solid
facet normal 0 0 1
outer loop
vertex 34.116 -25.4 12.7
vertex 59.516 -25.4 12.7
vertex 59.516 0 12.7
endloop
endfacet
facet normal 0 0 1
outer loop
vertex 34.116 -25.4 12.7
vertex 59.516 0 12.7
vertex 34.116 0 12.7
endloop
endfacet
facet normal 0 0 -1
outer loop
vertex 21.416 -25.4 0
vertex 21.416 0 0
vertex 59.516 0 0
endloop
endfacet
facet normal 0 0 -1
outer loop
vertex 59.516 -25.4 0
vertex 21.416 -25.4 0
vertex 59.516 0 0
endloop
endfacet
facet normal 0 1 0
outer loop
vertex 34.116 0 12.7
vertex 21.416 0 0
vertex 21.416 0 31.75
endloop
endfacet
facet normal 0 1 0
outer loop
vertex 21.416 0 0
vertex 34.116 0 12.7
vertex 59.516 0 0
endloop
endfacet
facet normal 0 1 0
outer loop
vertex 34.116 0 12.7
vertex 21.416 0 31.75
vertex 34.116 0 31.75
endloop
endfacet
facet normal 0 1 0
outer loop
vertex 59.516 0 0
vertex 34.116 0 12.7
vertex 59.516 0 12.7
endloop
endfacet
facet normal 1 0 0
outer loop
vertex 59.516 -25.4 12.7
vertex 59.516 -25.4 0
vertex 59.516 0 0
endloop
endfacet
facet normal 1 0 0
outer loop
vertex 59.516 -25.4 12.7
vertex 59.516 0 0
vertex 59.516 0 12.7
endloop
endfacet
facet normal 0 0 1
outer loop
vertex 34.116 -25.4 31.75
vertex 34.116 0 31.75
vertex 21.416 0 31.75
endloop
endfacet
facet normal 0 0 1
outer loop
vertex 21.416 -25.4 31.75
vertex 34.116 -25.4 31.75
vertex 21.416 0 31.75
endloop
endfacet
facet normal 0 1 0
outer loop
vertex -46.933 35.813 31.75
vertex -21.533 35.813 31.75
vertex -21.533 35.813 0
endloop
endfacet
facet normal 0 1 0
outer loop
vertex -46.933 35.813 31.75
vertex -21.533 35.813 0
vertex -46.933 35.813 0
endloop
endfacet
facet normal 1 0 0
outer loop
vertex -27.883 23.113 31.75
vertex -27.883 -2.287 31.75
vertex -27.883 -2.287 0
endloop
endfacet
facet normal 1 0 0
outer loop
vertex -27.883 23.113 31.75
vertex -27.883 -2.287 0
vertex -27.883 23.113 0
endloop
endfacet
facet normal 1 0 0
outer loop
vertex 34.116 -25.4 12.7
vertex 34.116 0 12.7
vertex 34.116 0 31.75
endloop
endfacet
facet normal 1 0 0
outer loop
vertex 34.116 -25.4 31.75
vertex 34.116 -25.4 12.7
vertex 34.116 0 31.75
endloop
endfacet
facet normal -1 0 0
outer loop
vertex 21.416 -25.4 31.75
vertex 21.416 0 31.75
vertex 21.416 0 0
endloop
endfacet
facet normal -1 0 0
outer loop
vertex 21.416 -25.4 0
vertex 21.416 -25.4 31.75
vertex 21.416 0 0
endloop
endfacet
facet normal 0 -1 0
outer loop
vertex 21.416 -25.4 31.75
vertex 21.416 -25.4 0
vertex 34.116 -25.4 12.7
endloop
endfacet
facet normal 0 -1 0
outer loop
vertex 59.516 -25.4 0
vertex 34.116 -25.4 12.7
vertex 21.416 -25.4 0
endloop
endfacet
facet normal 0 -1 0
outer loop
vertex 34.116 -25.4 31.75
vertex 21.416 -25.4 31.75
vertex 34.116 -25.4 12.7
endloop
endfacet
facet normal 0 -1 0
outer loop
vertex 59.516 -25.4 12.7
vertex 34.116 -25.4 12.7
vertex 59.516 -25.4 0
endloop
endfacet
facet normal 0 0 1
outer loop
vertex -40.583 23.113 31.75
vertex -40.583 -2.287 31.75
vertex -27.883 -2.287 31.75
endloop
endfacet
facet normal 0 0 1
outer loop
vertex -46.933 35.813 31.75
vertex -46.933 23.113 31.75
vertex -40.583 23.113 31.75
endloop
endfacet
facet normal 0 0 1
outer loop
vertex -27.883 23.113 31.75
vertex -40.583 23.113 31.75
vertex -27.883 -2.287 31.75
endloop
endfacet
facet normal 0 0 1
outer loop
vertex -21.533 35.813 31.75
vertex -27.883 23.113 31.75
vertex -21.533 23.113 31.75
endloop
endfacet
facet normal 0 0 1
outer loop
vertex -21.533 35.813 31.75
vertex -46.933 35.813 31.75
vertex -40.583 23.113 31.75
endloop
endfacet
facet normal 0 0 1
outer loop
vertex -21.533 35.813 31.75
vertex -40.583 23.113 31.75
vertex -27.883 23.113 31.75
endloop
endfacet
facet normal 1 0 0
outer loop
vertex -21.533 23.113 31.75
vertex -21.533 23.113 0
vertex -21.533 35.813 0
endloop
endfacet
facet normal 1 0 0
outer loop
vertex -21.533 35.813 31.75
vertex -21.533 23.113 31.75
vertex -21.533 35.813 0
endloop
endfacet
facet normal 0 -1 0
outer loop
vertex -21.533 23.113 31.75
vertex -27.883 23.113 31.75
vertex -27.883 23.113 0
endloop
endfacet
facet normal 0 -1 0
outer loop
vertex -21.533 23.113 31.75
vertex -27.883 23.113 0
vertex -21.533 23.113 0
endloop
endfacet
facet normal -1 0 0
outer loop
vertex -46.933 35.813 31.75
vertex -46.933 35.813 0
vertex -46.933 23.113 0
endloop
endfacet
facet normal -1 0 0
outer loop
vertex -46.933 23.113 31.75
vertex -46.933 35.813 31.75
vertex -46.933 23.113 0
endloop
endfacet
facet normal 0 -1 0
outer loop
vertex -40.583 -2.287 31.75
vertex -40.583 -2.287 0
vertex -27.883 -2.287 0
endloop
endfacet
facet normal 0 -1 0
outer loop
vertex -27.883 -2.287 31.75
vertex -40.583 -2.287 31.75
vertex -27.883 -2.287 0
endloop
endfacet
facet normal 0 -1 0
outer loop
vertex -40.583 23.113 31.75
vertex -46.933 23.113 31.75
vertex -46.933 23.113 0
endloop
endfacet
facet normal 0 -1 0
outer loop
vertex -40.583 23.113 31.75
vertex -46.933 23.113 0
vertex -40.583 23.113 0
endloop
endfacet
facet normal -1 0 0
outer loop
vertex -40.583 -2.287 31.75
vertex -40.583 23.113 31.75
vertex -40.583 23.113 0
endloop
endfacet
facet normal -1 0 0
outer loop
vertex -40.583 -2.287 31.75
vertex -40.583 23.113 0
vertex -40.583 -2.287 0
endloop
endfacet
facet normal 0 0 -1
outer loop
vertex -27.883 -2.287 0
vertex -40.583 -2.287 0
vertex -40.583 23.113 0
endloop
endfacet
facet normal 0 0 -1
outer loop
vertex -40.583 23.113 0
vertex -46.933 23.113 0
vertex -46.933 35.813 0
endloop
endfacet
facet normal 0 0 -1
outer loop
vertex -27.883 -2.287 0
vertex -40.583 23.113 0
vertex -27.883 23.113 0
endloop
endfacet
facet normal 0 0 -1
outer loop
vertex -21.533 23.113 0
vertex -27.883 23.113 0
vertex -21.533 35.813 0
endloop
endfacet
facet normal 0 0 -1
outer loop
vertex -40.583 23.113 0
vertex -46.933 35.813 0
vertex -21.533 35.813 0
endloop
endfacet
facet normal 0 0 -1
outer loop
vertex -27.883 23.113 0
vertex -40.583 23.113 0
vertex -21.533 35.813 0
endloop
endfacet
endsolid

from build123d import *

# Parameters (mm, degrees)
F1_DEPTH = 25.4
F3_DEPTH = 31.75


with BuildPart() as f1:
    # F0 (on Front) → F1 (new body)
    with BuildSketch(Plane.XZ):
        Polygon((34.116079, 31.75), (21.416079, 31.75), (21.416079, 0), (59.516079, 0), (59.516079, 12.7), (34.116079, 12.7), align=None)
    extrude(amount=F1_DEPTH)


with BuildPart() as f3:
    # F2 (on Top) → F3 (new body)
    with BuildSketch(Plane.XY):
        Polygon((-21.532532, 35.813233), (-46.932532, 35.813233), (-46.932532, 23.113233), (-40.582532, 23.113233), (-40.582532, -2.286767), (-27.882532, -2.286767), (-27.882532, 23.113233), (-21.532532, 23.113233), align=None)
    extrude(amount=F3_DEPTH)


solid = Compound([f1.part, f3.part])
